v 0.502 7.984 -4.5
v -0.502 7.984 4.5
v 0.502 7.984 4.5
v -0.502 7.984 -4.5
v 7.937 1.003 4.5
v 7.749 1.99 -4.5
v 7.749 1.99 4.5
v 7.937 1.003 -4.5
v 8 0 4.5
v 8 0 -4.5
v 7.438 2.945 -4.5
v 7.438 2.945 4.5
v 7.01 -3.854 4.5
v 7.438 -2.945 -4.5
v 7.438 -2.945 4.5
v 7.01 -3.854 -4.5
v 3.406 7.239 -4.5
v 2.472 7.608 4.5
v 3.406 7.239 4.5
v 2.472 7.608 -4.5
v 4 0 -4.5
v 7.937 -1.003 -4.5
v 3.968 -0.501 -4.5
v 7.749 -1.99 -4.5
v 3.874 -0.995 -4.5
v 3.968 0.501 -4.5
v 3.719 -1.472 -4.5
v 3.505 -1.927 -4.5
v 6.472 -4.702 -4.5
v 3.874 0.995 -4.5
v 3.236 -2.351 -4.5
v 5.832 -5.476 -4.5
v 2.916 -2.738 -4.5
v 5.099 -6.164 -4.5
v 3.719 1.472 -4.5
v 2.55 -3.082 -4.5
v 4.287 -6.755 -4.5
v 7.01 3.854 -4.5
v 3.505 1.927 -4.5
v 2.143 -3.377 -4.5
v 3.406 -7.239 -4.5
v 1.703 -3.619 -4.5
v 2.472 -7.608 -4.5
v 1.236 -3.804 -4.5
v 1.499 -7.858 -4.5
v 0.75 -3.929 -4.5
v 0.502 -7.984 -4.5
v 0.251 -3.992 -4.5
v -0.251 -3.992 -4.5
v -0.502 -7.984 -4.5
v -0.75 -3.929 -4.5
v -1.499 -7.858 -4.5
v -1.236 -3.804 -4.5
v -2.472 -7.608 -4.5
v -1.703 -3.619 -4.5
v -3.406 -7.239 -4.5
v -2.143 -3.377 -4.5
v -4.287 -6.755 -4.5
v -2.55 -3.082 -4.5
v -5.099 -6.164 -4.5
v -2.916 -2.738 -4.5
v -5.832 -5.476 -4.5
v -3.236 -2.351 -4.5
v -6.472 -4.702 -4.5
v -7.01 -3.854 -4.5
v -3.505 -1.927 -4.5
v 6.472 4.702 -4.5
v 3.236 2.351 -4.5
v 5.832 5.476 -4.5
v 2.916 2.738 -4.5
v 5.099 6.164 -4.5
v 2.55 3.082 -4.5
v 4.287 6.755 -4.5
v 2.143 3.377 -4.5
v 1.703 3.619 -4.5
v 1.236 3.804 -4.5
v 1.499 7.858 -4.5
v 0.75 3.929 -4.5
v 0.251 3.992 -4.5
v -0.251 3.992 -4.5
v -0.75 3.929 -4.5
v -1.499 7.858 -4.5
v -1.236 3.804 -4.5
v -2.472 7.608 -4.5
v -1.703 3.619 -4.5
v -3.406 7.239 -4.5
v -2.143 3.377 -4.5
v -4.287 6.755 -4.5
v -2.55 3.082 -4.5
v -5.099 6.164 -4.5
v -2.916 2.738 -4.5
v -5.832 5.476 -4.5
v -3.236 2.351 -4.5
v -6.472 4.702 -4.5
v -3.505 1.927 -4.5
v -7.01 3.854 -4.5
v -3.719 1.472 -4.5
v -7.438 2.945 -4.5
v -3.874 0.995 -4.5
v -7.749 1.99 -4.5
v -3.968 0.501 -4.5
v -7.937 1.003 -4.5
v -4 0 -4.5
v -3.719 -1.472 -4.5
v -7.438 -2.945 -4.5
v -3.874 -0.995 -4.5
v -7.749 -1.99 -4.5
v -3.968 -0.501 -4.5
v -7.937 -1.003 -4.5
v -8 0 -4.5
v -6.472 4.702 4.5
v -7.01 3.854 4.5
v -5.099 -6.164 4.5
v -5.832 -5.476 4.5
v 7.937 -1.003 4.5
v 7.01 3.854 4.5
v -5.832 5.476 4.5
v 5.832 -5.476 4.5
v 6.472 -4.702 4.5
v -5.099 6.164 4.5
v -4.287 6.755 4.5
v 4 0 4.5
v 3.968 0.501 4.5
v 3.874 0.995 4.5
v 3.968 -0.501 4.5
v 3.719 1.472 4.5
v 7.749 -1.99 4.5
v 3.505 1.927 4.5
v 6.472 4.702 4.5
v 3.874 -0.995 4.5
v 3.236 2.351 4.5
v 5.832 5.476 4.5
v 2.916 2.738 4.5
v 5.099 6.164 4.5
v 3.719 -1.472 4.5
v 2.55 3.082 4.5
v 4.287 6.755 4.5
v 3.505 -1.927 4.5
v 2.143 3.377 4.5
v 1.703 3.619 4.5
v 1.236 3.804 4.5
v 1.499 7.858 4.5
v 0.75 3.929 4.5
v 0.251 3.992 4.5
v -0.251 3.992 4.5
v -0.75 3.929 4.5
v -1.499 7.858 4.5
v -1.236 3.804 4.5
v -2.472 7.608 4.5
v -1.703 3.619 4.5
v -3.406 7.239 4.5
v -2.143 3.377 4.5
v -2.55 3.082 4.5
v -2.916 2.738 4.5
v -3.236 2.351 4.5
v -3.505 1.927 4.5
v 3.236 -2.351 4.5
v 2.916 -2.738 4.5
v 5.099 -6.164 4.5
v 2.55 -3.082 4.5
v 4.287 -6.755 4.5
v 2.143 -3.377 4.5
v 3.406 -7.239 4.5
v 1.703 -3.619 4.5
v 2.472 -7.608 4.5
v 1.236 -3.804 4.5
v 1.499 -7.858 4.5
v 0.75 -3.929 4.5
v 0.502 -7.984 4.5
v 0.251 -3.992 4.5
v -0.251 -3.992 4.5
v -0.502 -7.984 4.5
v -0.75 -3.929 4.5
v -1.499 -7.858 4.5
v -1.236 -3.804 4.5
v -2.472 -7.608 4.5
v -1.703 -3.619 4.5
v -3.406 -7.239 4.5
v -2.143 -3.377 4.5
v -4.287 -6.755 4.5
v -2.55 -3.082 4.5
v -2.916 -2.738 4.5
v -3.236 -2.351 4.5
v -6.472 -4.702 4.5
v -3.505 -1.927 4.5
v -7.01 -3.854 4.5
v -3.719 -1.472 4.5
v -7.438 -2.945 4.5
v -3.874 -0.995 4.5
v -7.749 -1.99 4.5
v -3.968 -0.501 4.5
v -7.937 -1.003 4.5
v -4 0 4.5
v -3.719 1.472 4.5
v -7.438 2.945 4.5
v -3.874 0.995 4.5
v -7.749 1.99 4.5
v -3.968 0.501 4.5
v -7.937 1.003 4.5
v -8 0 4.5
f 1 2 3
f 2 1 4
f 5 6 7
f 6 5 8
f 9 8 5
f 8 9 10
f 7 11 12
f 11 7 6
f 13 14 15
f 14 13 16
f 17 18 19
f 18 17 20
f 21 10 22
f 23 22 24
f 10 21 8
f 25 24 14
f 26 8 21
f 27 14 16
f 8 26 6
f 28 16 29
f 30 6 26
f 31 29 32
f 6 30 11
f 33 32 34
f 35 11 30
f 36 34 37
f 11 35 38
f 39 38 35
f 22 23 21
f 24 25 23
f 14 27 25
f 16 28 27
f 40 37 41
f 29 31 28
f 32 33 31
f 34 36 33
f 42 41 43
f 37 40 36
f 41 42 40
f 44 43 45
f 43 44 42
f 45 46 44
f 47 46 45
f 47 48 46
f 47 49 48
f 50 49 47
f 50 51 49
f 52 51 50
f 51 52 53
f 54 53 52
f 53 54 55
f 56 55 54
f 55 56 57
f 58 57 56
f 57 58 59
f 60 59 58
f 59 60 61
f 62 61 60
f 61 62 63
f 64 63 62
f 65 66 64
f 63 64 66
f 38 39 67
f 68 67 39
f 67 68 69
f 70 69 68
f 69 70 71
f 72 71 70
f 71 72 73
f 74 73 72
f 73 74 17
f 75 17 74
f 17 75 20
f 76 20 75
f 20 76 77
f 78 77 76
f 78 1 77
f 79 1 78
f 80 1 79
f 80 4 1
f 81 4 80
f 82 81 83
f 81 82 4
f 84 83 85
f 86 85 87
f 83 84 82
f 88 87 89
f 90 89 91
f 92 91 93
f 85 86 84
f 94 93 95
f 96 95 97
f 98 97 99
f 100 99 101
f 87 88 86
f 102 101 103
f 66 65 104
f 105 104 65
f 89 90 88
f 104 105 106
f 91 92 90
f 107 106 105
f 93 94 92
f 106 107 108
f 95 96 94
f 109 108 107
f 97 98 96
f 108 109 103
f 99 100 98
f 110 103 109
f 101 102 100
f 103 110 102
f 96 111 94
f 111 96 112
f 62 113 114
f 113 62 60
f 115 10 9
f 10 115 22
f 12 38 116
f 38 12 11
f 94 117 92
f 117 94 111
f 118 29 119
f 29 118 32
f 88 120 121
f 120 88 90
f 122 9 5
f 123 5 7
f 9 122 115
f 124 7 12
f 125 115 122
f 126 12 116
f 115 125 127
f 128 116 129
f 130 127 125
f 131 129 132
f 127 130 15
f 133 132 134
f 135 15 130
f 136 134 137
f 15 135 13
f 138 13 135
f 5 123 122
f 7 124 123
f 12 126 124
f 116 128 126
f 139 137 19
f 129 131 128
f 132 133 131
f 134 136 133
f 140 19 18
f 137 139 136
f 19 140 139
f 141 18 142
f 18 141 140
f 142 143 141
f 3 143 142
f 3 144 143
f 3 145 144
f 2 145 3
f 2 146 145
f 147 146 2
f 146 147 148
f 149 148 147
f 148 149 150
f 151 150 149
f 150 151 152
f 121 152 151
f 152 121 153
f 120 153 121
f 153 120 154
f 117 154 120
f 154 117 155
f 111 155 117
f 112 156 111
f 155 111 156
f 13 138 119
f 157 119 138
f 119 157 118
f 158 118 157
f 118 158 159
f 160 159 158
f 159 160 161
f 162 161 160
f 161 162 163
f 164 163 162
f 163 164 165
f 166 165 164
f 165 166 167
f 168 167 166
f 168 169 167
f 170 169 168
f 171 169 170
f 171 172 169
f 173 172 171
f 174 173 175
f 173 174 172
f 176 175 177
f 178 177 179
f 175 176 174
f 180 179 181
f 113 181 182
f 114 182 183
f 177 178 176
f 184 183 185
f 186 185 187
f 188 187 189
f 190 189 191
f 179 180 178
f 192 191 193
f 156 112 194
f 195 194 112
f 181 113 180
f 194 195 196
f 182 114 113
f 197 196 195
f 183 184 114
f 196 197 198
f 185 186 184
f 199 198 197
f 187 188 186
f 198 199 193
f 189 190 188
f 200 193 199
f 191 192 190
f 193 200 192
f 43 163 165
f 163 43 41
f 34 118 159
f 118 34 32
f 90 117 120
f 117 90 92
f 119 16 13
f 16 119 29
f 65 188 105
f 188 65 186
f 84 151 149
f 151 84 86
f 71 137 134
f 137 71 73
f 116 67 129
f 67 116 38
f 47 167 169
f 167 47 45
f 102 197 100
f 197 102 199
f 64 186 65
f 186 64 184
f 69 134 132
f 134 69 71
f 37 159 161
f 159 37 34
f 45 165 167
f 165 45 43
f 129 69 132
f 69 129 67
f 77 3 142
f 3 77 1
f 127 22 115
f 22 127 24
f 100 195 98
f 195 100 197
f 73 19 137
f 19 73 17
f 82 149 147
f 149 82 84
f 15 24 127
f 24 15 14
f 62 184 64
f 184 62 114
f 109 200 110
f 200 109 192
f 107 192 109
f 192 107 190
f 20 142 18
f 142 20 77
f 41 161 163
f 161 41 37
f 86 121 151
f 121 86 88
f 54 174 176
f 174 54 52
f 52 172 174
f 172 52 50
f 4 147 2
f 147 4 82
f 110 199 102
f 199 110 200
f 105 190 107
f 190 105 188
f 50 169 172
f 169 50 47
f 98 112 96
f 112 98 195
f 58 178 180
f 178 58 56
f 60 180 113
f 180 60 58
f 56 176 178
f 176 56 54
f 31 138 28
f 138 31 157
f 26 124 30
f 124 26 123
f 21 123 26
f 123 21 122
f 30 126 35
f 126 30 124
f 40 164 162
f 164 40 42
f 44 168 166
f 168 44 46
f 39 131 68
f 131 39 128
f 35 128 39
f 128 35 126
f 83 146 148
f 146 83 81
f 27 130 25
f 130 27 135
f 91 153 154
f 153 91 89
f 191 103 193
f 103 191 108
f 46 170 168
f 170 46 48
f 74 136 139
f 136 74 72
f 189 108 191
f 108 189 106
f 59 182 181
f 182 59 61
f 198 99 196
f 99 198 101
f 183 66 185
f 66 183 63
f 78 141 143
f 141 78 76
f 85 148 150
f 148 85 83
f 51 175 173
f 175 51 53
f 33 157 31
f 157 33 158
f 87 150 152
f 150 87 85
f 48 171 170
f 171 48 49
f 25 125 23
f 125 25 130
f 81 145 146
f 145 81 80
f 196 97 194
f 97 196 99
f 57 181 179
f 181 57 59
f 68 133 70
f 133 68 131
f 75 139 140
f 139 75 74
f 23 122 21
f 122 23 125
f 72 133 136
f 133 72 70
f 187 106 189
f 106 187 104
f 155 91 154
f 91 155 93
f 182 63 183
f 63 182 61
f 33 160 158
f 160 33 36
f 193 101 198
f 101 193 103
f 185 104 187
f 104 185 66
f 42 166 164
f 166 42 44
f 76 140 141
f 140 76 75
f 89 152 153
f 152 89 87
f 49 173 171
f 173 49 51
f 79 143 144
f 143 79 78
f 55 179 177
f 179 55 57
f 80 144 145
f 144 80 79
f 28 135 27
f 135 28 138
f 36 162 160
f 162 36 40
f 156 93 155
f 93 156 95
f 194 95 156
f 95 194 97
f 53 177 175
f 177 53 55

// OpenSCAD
$fn = 50;


difference() {
	union() {
		translate(v = [0, 0, -4.5000000000]) {
			cylinder(h = 9, r = 8.0000000000);
		}
	}
	union() {
		translate(v = [0, 0, -100.0000000000]) {
			cylinder(h = 200, r = 4.0000000000);
		}
	}
}
